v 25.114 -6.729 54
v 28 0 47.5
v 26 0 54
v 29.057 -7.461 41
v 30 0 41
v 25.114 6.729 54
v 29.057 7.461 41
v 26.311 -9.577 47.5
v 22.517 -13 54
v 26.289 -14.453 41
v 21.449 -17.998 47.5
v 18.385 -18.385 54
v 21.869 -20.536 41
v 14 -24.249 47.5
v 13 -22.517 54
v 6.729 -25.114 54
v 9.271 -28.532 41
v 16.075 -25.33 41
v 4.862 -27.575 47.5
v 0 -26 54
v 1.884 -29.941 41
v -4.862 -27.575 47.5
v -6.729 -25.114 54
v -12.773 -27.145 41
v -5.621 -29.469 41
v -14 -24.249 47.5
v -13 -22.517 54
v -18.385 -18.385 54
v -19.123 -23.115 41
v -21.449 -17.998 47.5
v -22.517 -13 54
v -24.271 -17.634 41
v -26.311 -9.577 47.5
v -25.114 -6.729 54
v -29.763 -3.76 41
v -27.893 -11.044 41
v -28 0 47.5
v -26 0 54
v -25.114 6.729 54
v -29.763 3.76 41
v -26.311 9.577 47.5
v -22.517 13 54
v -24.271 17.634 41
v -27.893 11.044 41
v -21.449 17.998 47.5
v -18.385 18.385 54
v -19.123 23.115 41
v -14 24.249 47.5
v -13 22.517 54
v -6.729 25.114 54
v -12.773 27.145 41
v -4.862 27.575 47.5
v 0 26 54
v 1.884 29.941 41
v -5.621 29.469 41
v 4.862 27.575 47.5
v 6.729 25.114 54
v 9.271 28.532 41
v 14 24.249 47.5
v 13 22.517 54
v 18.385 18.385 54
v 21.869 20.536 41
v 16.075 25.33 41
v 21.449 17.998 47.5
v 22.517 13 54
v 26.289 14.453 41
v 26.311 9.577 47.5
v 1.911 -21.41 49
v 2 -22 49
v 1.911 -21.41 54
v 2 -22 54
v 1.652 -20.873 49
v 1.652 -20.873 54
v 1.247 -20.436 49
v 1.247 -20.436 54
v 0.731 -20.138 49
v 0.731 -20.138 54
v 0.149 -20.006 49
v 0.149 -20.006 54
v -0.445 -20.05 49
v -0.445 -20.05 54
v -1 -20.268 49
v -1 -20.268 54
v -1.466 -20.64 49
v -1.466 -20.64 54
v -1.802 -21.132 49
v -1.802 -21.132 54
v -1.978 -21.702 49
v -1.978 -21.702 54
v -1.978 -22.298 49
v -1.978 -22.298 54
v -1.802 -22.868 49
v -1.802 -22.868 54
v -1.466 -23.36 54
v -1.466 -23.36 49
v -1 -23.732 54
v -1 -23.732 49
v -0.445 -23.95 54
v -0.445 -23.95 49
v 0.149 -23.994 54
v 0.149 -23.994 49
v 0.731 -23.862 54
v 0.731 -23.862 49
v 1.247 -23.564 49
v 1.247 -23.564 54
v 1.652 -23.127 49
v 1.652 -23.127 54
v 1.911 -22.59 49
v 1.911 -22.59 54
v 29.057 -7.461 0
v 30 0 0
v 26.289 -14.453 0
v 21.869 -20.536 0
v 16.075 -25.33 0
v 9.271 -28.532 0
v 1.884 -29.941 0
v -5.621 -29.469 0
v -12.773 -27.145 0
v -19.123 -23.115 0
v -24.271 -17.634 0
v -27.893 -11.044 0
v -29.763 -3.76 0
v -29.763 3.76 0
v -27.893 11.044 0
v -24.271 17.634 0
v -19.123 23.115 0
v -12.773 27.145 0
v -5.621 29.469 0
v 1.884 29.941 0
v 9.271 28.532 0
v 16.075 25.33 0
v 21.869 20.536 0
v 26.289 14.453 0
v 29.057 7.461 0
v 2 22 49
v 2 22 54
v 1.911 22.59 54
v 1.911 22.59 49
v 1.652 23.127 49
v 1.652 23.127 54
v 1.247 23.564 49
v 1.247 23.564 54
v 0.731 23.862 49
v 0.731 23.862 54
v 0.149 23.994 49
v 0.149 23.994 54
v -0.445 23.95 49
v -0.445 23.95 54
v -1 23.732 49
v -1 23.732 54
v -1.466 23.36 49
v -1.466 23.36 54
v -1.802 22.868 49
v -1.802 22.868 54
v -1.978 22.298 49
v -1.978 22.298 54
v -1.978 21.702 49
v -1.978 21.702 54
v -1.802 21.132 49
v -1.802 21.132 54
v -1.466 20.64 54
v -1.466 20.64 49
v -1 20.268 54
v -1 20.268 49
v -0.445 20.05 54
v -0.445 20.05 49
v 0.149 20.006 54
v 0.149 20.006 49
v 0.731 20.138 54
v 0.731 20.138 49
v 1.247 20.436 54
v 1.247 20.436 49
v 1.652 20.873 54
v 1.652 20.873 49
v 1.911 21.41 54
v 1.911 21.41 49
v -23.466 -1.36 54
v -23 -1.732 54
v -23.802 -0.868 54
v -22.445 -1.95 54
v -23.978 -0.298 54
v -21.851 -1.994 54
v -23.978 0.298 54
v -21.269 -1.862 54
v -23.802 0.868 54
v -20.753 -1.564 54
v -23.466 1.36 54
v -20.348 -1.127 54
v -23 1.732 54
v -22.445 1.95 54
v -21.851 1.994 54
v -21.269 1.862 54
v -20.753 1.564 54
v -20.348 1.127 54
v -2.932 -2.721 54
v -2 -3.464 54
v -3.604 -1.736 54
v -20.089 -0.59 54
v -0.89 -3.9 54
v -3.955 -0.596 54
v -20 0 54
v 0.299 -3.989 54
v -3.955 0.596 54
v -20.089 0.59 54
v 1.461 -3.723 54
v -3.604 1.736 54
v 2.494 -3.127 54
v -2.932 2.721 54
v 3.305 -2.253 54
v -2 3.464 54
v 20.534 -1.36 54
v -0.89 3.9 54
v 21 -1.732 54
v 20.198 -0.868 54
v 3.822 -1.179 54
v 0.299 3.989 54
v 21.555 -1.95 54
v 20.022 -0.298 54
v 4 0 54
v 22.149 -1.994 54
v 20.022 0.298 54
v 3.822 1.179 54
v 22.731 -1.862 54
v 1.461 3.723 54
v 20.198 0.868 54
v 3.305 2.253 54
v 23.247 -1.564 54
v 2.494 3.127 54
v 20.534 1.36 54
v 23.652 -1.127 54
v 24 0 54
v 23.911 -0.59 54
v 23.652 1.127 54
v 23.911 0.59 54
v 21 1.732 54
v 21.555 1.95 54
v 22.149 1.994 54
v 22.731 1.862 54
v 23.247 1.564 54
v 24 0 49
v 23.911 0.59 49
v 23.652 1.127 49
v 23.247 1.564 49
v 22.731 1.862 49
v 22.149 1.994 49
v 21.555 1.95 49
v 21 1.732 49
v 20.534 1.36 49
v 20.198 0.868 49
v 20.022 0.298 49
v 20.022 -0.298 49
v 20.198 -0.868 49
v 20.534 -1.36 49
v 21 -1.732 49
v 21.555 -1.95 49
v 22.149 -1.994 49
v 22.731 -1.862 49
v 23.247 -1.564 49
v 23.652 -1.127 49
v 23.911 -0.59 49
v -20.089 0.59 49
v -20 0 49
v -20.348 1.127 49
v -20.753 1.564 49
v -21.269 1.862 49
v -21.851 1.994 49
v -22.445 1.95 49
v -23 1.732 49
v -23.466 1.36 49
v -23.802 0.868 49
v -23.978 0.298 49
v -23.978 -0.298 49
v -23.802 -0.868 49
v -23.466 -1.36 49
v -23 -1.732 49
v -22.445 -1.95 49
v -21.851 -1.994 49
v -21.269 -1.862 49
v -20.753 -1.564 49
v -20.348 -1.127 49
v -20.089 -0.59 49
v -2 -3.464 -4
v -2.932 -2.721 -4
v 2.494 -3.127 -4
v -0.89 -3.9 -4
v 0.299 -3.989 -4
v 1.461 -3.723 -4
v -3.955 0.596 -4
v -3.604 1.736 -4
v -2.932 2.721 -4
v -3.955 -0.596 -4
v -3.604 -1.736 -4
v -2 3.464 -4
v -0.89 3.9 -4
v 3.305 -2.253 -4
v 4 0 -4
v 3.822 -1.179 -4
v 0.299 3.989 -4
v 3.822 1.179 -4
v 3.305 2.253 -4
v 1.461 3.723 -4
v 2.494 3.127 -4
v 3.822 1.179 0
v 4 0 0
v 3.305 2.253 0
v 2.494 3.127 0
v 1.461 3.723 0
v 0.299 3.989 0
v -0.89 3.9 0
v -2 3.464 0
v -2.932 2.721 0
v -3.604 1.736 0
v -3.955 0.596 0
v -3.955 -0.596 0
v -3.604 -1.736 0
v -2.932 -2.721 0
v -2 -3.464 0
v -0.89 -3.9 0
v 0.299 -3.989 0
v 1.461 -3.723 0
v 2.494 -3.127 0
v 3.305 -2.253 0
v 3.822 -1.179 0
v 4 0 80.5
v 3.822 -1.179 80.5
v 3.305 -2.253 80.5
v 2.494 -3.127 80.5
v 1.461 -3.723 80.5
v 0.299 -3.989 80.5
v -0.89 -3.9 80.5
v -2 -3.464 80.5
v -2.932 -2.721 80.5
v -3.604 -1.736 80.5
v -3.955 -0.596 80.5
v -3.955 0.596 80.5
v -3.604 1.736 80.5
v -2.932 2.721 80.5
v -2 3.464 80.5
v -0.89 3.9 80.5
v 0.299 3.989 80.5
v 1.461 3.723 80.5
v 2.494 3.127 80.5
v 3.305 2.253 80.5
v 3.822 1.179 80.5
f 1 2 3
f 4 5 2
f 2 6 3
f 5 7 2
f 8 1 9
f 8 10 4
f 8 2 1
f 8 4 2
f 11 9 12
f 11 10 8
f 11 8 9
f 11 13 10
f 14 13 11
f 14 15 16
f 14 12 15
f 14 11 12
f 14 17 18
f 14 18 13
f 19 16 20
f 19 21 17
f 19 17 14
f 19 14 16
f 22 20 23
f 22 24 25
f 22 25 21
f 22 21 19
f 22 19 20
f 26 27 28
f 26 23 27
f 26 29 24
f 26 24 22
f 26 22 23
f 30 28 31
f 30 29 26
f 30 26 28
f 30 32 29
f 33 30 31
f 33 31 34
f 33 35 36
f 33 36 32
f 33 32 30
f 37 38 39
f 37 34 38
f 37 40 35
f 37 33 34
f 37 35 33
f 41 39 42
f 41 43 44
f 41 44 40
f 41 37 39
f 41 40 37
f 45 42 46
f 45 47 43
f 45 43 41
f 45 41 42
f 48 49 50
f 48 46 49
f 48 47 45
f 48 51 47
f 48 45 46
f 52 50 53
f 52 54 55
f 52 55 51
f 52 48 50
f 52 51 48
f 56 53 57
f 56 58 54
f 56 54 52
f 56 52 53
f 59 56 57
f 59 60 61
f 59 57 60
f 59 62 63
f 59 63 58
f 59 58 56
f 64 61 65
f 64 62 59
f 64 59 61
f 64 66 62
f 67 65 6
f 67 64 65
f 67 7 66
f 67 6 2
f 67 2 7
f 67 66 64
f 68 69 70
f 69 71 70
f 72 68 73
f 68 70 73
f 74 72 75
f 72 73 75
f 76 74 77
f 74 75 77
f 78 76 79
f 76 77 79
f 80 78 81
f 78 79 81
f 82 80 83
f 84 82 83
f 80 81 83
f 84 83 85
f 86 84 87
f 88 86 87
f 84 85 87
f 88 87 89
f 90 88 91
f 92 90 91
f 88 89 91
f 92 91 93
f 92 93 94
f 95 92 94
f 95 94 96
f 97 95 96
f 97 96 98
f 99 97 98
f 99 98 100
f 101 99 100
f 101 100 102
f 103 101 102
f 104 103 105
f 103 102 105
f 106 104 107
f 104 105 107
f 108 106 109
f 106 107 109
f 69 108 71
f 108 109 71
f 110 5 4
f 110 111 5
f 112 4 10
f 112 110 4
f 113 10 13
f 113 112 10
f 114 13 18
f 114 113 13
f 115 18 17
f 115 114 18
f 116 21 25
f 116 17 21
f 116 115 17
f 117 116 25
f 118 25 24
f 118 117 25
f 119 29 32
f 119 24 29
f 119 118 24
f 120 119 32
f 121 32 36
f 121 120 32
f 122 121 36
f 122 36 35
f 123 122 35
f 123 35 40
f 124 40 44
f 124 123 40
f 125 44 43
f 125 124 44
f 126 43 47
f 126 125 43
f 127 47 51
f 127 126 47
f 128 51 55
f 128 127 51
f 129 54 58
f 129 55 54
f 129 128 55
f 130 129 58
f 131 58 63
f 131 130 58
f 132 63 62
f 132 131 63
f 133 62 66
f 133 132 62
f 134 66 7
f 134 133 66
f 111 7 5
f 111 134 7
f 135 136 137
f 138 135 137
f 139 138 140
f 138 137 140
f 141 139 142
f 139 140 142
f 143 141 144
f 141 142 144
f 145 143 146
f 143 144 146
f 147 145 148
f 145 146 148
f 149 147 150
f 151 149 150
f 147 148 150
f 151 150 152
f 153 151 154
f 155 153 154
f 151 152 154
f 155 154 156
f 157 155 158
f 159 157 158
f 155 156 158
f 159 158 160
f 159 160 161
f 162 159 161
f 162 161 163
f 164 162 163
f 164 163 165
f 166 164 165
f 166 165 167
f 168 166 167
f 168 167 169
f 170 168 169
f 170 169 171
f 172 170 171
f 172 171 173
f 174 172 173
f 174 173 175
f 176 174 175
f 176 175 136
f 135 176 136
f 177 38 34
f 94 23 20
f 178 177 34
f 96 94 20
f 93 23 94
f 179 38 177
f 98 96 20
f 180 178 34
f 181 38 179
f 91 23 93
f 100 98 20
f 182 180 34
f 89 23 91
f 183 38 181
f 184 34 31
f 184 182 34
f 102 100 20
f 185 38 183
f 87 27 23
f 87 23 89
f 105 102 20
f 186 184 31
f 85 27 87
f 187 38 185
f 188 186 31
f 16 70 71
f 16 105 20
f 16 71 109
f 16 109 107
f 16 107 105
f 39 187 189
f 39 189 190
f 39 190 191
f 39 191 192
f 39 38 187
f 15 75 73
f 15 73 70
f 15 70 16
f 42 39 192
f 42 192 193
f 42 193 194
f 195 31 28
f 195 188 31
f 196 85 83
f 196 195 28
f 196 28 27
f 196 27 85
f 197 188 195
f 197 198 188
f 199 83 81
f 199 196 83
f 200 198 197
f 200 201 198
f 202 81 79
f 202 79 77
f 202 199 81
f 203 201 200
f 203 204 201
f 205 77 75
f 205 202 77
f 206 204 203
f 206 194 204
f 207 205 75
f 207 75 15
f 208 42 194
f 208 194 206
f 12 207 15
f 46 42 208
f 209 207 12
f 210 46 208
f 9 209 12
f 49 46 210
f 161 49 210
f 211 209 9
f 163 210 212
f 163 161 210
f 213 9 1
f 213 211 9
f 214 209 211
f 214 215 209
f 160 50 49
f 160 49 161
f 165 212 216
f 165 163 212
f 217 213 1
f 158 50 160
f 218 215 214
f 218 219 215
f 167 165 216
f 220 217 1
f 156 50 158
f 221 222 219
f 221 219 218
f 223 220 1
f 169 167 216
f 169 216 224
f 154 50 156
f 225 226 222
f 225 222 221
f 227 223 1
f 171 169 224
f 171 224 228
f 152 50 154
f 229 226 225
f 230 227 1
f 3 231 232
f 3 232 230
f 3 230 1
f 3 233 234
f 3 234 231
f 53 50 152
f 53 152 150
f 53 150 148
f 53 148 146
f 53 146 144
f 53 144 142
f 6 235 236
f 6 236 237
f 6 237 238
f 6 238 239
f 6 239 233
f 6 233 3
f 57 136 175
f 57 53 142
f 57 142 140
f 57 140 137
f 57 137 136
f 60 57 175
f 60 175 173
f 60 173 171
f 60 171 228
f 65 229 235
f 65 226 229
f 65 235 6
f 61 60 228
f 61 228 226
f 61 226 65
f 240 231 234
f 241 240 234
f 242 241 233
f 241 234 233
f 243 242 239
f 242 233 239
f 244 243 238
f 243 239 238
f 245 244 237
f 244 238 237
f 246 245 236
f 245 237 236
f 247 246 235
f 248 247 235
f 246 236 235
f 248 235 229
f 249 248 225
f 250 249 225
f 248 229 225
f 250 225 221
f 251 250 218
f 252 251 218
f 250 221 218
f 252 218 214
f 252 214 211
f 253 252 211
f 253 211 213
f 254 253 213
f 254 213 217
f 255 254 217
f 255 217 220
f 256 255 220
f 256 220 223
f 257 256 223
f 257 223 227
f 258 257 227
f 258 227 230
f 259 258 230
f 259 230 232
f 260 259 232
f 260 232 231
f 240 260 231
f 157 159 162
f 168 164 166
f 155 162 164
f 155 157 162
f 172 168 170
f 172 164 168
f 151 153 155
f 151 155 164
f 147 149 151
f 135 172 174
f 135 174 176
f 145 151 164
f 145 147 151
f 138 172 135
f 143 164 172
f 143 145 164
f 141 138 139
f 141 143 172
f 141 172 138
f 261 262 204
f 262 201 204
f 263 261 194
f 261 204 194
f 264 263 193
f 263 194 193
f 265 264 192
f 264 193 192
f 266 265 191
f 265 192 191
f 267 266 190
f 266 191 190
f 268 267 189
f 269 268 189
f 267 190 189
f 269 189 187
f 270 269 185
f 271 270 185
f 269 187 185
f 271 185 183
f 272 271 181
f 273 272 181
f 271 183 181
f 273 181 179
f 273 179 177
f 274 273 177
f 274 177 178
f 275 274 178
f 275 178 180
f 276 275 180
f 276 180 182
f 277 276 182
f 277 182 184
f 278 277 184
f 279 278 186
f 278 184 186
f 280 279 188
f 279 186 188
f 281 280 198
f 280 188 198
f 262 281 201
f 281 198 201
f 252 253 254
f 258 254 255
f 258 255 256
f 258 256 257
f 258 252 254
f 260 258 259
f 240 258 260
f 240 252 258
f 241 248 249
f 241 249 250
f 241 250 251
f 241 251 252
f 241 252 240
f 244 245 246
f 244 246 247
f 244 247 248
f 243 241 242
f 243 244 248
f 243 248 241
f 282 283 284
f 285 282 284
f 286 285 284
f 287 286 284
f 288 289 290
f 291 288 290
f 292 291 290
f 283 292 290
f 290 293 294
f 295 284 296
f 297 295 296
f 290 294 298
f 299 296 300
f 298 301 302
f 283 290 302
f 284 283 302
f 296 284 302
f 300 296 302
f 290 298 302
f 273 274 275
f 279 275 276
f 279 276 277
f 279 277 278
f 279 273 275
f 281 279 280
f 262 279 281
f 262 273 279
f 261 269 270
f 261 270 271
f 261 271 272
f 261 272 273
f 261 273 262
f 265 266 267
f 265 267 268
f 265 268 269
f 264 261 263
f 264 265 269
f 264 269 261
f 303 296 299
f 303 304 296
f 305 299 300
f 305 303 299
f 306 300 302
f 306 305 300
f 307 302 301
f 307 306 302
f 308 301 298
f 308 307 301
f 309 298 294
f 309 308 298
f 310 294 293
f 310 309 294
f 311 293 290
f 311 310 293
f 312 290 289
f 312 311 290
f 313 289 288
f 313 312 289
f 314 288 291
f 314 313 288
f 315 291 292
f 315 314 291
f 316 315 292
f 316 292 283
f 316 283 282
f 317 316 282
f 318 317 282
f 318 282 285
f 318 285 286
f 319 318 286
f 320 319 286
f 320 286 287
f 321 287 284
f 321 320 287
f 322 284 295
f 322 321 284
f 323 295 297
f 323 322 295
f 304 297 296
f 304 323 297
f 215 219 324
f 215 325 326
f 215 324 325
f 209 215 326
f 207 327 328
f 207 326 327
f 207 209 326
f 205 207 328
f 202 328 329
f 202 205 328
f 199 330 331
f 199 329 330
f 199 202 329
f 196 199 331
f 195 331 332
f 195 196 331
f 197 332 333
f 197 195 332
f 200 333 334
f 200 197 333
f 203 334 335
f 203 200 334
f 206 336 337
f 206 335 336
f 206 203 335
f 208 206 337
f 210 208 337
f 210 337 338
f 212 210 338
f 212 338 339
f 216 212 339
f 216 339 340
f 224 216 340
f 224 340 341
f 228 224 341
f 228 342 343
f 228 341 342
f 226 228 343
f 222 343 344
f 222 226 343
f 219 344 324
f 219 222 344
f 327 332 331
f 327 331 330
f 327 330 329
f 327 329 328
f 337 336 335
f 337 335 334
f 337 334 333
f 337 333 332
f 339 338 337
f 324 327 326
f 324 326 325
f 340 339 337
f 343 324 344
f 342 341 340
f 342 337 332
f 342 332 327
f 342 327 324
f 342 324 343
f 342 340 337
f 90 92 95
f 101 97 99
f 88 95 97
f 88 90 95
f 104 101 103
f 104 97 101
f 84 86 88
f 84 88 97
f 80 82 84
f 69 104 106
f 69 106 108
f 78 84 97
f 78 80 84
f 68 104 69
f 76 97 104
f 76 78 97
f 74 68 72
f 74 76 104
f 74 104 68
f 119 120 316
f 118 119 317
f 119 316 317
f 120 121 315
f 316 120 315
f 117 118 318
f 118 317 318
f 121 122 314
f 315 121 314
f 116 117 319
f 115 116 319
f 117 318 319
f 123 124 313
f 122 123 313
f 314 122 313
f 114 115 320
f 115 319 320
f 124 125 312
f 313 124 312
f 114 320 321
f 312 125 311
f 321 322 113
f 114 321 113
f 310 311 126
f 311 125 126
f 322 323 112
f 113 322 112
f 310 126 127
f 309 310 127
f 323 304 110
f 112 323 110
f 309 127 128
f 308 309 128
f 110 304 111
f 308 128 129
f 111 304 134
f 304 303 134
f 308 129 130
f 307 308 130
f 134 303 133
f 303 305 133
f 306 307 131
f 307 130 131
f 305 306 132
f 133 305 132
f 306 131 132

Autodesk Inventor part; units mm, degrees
ref_plane "YZ Plane" through (0, 0, 0) normal (1, 0, 0) x (0, 1, 0)
ref_plane "XZ Plane" through (0, 0, 0) normal (0, 1, 0) x (-1, 0, 0)
sketch "Sketch1" plane through (0, 0, 0) normal (0, 0, 1) x (1, 0, 0)
  circle A0 centre (0, 0) radius 30
  dimension "d0" = 60
extrude "Extrusion1" add sketch "Sketch1" along normal blind 41
ref_plane "Work Plane1" through (0, 0, 54) normal (0, 0, 1) x (1, 0, 0)
sketch "Sketch2" plane through (0, 0, 54) normal (0, 0, 1) x (1, 0, 0)
  circle A0 centre (0, 0) radius 26
  dimension "d4" = 52
loft "Loft1" add profiles "Sketch2" section 1 edges at (-30, 0, 41)
sketch "Sketch4" plane through (0, 0, 54) normal (0, 0, 1) x (1, 0, 0)
  point P0 (0, 0)
sketch "Sketch5" plane through (0, 0, 54) normal (0, 0, 1) x (1, 0, 0)
  circle A0 centre (0, 22) radius 2
  circle A1 centre (0, -22) radius 2
  circle A2 centre (0, 0) radius 22
  circle A3 centre (-22, 0) radius 2
  circle A4 centre (22, 0) radius 2
  dimension "d11" = 4
  dimension "d12" = 44
extrude "Extrusion2" cut sketch "Sketch5" against normal blind 5 contours A0 A2 | A2 A0 | A3 A2 | A2 A3 | A4 A2 | A2 A4 | A2 A1 | A1 A2
sketch "Sketch6" plane through (0, 0, 0) normal (0, 0, -1) x (-1, 0, 0)
  point P0 (0, 0)
sketch "Sketch7" plane through (0, 0, 54) normal (0, 0, 1) x (1, 0, 0)
  circle A0 centre (0, 0) radius 4
  dimension "d16" = 8
extrude "Extrusion3" add sketch "Sketch7" along normal blind 26.5 and the other way blind 58
properties part number "CH-1-02-driveMotor"
